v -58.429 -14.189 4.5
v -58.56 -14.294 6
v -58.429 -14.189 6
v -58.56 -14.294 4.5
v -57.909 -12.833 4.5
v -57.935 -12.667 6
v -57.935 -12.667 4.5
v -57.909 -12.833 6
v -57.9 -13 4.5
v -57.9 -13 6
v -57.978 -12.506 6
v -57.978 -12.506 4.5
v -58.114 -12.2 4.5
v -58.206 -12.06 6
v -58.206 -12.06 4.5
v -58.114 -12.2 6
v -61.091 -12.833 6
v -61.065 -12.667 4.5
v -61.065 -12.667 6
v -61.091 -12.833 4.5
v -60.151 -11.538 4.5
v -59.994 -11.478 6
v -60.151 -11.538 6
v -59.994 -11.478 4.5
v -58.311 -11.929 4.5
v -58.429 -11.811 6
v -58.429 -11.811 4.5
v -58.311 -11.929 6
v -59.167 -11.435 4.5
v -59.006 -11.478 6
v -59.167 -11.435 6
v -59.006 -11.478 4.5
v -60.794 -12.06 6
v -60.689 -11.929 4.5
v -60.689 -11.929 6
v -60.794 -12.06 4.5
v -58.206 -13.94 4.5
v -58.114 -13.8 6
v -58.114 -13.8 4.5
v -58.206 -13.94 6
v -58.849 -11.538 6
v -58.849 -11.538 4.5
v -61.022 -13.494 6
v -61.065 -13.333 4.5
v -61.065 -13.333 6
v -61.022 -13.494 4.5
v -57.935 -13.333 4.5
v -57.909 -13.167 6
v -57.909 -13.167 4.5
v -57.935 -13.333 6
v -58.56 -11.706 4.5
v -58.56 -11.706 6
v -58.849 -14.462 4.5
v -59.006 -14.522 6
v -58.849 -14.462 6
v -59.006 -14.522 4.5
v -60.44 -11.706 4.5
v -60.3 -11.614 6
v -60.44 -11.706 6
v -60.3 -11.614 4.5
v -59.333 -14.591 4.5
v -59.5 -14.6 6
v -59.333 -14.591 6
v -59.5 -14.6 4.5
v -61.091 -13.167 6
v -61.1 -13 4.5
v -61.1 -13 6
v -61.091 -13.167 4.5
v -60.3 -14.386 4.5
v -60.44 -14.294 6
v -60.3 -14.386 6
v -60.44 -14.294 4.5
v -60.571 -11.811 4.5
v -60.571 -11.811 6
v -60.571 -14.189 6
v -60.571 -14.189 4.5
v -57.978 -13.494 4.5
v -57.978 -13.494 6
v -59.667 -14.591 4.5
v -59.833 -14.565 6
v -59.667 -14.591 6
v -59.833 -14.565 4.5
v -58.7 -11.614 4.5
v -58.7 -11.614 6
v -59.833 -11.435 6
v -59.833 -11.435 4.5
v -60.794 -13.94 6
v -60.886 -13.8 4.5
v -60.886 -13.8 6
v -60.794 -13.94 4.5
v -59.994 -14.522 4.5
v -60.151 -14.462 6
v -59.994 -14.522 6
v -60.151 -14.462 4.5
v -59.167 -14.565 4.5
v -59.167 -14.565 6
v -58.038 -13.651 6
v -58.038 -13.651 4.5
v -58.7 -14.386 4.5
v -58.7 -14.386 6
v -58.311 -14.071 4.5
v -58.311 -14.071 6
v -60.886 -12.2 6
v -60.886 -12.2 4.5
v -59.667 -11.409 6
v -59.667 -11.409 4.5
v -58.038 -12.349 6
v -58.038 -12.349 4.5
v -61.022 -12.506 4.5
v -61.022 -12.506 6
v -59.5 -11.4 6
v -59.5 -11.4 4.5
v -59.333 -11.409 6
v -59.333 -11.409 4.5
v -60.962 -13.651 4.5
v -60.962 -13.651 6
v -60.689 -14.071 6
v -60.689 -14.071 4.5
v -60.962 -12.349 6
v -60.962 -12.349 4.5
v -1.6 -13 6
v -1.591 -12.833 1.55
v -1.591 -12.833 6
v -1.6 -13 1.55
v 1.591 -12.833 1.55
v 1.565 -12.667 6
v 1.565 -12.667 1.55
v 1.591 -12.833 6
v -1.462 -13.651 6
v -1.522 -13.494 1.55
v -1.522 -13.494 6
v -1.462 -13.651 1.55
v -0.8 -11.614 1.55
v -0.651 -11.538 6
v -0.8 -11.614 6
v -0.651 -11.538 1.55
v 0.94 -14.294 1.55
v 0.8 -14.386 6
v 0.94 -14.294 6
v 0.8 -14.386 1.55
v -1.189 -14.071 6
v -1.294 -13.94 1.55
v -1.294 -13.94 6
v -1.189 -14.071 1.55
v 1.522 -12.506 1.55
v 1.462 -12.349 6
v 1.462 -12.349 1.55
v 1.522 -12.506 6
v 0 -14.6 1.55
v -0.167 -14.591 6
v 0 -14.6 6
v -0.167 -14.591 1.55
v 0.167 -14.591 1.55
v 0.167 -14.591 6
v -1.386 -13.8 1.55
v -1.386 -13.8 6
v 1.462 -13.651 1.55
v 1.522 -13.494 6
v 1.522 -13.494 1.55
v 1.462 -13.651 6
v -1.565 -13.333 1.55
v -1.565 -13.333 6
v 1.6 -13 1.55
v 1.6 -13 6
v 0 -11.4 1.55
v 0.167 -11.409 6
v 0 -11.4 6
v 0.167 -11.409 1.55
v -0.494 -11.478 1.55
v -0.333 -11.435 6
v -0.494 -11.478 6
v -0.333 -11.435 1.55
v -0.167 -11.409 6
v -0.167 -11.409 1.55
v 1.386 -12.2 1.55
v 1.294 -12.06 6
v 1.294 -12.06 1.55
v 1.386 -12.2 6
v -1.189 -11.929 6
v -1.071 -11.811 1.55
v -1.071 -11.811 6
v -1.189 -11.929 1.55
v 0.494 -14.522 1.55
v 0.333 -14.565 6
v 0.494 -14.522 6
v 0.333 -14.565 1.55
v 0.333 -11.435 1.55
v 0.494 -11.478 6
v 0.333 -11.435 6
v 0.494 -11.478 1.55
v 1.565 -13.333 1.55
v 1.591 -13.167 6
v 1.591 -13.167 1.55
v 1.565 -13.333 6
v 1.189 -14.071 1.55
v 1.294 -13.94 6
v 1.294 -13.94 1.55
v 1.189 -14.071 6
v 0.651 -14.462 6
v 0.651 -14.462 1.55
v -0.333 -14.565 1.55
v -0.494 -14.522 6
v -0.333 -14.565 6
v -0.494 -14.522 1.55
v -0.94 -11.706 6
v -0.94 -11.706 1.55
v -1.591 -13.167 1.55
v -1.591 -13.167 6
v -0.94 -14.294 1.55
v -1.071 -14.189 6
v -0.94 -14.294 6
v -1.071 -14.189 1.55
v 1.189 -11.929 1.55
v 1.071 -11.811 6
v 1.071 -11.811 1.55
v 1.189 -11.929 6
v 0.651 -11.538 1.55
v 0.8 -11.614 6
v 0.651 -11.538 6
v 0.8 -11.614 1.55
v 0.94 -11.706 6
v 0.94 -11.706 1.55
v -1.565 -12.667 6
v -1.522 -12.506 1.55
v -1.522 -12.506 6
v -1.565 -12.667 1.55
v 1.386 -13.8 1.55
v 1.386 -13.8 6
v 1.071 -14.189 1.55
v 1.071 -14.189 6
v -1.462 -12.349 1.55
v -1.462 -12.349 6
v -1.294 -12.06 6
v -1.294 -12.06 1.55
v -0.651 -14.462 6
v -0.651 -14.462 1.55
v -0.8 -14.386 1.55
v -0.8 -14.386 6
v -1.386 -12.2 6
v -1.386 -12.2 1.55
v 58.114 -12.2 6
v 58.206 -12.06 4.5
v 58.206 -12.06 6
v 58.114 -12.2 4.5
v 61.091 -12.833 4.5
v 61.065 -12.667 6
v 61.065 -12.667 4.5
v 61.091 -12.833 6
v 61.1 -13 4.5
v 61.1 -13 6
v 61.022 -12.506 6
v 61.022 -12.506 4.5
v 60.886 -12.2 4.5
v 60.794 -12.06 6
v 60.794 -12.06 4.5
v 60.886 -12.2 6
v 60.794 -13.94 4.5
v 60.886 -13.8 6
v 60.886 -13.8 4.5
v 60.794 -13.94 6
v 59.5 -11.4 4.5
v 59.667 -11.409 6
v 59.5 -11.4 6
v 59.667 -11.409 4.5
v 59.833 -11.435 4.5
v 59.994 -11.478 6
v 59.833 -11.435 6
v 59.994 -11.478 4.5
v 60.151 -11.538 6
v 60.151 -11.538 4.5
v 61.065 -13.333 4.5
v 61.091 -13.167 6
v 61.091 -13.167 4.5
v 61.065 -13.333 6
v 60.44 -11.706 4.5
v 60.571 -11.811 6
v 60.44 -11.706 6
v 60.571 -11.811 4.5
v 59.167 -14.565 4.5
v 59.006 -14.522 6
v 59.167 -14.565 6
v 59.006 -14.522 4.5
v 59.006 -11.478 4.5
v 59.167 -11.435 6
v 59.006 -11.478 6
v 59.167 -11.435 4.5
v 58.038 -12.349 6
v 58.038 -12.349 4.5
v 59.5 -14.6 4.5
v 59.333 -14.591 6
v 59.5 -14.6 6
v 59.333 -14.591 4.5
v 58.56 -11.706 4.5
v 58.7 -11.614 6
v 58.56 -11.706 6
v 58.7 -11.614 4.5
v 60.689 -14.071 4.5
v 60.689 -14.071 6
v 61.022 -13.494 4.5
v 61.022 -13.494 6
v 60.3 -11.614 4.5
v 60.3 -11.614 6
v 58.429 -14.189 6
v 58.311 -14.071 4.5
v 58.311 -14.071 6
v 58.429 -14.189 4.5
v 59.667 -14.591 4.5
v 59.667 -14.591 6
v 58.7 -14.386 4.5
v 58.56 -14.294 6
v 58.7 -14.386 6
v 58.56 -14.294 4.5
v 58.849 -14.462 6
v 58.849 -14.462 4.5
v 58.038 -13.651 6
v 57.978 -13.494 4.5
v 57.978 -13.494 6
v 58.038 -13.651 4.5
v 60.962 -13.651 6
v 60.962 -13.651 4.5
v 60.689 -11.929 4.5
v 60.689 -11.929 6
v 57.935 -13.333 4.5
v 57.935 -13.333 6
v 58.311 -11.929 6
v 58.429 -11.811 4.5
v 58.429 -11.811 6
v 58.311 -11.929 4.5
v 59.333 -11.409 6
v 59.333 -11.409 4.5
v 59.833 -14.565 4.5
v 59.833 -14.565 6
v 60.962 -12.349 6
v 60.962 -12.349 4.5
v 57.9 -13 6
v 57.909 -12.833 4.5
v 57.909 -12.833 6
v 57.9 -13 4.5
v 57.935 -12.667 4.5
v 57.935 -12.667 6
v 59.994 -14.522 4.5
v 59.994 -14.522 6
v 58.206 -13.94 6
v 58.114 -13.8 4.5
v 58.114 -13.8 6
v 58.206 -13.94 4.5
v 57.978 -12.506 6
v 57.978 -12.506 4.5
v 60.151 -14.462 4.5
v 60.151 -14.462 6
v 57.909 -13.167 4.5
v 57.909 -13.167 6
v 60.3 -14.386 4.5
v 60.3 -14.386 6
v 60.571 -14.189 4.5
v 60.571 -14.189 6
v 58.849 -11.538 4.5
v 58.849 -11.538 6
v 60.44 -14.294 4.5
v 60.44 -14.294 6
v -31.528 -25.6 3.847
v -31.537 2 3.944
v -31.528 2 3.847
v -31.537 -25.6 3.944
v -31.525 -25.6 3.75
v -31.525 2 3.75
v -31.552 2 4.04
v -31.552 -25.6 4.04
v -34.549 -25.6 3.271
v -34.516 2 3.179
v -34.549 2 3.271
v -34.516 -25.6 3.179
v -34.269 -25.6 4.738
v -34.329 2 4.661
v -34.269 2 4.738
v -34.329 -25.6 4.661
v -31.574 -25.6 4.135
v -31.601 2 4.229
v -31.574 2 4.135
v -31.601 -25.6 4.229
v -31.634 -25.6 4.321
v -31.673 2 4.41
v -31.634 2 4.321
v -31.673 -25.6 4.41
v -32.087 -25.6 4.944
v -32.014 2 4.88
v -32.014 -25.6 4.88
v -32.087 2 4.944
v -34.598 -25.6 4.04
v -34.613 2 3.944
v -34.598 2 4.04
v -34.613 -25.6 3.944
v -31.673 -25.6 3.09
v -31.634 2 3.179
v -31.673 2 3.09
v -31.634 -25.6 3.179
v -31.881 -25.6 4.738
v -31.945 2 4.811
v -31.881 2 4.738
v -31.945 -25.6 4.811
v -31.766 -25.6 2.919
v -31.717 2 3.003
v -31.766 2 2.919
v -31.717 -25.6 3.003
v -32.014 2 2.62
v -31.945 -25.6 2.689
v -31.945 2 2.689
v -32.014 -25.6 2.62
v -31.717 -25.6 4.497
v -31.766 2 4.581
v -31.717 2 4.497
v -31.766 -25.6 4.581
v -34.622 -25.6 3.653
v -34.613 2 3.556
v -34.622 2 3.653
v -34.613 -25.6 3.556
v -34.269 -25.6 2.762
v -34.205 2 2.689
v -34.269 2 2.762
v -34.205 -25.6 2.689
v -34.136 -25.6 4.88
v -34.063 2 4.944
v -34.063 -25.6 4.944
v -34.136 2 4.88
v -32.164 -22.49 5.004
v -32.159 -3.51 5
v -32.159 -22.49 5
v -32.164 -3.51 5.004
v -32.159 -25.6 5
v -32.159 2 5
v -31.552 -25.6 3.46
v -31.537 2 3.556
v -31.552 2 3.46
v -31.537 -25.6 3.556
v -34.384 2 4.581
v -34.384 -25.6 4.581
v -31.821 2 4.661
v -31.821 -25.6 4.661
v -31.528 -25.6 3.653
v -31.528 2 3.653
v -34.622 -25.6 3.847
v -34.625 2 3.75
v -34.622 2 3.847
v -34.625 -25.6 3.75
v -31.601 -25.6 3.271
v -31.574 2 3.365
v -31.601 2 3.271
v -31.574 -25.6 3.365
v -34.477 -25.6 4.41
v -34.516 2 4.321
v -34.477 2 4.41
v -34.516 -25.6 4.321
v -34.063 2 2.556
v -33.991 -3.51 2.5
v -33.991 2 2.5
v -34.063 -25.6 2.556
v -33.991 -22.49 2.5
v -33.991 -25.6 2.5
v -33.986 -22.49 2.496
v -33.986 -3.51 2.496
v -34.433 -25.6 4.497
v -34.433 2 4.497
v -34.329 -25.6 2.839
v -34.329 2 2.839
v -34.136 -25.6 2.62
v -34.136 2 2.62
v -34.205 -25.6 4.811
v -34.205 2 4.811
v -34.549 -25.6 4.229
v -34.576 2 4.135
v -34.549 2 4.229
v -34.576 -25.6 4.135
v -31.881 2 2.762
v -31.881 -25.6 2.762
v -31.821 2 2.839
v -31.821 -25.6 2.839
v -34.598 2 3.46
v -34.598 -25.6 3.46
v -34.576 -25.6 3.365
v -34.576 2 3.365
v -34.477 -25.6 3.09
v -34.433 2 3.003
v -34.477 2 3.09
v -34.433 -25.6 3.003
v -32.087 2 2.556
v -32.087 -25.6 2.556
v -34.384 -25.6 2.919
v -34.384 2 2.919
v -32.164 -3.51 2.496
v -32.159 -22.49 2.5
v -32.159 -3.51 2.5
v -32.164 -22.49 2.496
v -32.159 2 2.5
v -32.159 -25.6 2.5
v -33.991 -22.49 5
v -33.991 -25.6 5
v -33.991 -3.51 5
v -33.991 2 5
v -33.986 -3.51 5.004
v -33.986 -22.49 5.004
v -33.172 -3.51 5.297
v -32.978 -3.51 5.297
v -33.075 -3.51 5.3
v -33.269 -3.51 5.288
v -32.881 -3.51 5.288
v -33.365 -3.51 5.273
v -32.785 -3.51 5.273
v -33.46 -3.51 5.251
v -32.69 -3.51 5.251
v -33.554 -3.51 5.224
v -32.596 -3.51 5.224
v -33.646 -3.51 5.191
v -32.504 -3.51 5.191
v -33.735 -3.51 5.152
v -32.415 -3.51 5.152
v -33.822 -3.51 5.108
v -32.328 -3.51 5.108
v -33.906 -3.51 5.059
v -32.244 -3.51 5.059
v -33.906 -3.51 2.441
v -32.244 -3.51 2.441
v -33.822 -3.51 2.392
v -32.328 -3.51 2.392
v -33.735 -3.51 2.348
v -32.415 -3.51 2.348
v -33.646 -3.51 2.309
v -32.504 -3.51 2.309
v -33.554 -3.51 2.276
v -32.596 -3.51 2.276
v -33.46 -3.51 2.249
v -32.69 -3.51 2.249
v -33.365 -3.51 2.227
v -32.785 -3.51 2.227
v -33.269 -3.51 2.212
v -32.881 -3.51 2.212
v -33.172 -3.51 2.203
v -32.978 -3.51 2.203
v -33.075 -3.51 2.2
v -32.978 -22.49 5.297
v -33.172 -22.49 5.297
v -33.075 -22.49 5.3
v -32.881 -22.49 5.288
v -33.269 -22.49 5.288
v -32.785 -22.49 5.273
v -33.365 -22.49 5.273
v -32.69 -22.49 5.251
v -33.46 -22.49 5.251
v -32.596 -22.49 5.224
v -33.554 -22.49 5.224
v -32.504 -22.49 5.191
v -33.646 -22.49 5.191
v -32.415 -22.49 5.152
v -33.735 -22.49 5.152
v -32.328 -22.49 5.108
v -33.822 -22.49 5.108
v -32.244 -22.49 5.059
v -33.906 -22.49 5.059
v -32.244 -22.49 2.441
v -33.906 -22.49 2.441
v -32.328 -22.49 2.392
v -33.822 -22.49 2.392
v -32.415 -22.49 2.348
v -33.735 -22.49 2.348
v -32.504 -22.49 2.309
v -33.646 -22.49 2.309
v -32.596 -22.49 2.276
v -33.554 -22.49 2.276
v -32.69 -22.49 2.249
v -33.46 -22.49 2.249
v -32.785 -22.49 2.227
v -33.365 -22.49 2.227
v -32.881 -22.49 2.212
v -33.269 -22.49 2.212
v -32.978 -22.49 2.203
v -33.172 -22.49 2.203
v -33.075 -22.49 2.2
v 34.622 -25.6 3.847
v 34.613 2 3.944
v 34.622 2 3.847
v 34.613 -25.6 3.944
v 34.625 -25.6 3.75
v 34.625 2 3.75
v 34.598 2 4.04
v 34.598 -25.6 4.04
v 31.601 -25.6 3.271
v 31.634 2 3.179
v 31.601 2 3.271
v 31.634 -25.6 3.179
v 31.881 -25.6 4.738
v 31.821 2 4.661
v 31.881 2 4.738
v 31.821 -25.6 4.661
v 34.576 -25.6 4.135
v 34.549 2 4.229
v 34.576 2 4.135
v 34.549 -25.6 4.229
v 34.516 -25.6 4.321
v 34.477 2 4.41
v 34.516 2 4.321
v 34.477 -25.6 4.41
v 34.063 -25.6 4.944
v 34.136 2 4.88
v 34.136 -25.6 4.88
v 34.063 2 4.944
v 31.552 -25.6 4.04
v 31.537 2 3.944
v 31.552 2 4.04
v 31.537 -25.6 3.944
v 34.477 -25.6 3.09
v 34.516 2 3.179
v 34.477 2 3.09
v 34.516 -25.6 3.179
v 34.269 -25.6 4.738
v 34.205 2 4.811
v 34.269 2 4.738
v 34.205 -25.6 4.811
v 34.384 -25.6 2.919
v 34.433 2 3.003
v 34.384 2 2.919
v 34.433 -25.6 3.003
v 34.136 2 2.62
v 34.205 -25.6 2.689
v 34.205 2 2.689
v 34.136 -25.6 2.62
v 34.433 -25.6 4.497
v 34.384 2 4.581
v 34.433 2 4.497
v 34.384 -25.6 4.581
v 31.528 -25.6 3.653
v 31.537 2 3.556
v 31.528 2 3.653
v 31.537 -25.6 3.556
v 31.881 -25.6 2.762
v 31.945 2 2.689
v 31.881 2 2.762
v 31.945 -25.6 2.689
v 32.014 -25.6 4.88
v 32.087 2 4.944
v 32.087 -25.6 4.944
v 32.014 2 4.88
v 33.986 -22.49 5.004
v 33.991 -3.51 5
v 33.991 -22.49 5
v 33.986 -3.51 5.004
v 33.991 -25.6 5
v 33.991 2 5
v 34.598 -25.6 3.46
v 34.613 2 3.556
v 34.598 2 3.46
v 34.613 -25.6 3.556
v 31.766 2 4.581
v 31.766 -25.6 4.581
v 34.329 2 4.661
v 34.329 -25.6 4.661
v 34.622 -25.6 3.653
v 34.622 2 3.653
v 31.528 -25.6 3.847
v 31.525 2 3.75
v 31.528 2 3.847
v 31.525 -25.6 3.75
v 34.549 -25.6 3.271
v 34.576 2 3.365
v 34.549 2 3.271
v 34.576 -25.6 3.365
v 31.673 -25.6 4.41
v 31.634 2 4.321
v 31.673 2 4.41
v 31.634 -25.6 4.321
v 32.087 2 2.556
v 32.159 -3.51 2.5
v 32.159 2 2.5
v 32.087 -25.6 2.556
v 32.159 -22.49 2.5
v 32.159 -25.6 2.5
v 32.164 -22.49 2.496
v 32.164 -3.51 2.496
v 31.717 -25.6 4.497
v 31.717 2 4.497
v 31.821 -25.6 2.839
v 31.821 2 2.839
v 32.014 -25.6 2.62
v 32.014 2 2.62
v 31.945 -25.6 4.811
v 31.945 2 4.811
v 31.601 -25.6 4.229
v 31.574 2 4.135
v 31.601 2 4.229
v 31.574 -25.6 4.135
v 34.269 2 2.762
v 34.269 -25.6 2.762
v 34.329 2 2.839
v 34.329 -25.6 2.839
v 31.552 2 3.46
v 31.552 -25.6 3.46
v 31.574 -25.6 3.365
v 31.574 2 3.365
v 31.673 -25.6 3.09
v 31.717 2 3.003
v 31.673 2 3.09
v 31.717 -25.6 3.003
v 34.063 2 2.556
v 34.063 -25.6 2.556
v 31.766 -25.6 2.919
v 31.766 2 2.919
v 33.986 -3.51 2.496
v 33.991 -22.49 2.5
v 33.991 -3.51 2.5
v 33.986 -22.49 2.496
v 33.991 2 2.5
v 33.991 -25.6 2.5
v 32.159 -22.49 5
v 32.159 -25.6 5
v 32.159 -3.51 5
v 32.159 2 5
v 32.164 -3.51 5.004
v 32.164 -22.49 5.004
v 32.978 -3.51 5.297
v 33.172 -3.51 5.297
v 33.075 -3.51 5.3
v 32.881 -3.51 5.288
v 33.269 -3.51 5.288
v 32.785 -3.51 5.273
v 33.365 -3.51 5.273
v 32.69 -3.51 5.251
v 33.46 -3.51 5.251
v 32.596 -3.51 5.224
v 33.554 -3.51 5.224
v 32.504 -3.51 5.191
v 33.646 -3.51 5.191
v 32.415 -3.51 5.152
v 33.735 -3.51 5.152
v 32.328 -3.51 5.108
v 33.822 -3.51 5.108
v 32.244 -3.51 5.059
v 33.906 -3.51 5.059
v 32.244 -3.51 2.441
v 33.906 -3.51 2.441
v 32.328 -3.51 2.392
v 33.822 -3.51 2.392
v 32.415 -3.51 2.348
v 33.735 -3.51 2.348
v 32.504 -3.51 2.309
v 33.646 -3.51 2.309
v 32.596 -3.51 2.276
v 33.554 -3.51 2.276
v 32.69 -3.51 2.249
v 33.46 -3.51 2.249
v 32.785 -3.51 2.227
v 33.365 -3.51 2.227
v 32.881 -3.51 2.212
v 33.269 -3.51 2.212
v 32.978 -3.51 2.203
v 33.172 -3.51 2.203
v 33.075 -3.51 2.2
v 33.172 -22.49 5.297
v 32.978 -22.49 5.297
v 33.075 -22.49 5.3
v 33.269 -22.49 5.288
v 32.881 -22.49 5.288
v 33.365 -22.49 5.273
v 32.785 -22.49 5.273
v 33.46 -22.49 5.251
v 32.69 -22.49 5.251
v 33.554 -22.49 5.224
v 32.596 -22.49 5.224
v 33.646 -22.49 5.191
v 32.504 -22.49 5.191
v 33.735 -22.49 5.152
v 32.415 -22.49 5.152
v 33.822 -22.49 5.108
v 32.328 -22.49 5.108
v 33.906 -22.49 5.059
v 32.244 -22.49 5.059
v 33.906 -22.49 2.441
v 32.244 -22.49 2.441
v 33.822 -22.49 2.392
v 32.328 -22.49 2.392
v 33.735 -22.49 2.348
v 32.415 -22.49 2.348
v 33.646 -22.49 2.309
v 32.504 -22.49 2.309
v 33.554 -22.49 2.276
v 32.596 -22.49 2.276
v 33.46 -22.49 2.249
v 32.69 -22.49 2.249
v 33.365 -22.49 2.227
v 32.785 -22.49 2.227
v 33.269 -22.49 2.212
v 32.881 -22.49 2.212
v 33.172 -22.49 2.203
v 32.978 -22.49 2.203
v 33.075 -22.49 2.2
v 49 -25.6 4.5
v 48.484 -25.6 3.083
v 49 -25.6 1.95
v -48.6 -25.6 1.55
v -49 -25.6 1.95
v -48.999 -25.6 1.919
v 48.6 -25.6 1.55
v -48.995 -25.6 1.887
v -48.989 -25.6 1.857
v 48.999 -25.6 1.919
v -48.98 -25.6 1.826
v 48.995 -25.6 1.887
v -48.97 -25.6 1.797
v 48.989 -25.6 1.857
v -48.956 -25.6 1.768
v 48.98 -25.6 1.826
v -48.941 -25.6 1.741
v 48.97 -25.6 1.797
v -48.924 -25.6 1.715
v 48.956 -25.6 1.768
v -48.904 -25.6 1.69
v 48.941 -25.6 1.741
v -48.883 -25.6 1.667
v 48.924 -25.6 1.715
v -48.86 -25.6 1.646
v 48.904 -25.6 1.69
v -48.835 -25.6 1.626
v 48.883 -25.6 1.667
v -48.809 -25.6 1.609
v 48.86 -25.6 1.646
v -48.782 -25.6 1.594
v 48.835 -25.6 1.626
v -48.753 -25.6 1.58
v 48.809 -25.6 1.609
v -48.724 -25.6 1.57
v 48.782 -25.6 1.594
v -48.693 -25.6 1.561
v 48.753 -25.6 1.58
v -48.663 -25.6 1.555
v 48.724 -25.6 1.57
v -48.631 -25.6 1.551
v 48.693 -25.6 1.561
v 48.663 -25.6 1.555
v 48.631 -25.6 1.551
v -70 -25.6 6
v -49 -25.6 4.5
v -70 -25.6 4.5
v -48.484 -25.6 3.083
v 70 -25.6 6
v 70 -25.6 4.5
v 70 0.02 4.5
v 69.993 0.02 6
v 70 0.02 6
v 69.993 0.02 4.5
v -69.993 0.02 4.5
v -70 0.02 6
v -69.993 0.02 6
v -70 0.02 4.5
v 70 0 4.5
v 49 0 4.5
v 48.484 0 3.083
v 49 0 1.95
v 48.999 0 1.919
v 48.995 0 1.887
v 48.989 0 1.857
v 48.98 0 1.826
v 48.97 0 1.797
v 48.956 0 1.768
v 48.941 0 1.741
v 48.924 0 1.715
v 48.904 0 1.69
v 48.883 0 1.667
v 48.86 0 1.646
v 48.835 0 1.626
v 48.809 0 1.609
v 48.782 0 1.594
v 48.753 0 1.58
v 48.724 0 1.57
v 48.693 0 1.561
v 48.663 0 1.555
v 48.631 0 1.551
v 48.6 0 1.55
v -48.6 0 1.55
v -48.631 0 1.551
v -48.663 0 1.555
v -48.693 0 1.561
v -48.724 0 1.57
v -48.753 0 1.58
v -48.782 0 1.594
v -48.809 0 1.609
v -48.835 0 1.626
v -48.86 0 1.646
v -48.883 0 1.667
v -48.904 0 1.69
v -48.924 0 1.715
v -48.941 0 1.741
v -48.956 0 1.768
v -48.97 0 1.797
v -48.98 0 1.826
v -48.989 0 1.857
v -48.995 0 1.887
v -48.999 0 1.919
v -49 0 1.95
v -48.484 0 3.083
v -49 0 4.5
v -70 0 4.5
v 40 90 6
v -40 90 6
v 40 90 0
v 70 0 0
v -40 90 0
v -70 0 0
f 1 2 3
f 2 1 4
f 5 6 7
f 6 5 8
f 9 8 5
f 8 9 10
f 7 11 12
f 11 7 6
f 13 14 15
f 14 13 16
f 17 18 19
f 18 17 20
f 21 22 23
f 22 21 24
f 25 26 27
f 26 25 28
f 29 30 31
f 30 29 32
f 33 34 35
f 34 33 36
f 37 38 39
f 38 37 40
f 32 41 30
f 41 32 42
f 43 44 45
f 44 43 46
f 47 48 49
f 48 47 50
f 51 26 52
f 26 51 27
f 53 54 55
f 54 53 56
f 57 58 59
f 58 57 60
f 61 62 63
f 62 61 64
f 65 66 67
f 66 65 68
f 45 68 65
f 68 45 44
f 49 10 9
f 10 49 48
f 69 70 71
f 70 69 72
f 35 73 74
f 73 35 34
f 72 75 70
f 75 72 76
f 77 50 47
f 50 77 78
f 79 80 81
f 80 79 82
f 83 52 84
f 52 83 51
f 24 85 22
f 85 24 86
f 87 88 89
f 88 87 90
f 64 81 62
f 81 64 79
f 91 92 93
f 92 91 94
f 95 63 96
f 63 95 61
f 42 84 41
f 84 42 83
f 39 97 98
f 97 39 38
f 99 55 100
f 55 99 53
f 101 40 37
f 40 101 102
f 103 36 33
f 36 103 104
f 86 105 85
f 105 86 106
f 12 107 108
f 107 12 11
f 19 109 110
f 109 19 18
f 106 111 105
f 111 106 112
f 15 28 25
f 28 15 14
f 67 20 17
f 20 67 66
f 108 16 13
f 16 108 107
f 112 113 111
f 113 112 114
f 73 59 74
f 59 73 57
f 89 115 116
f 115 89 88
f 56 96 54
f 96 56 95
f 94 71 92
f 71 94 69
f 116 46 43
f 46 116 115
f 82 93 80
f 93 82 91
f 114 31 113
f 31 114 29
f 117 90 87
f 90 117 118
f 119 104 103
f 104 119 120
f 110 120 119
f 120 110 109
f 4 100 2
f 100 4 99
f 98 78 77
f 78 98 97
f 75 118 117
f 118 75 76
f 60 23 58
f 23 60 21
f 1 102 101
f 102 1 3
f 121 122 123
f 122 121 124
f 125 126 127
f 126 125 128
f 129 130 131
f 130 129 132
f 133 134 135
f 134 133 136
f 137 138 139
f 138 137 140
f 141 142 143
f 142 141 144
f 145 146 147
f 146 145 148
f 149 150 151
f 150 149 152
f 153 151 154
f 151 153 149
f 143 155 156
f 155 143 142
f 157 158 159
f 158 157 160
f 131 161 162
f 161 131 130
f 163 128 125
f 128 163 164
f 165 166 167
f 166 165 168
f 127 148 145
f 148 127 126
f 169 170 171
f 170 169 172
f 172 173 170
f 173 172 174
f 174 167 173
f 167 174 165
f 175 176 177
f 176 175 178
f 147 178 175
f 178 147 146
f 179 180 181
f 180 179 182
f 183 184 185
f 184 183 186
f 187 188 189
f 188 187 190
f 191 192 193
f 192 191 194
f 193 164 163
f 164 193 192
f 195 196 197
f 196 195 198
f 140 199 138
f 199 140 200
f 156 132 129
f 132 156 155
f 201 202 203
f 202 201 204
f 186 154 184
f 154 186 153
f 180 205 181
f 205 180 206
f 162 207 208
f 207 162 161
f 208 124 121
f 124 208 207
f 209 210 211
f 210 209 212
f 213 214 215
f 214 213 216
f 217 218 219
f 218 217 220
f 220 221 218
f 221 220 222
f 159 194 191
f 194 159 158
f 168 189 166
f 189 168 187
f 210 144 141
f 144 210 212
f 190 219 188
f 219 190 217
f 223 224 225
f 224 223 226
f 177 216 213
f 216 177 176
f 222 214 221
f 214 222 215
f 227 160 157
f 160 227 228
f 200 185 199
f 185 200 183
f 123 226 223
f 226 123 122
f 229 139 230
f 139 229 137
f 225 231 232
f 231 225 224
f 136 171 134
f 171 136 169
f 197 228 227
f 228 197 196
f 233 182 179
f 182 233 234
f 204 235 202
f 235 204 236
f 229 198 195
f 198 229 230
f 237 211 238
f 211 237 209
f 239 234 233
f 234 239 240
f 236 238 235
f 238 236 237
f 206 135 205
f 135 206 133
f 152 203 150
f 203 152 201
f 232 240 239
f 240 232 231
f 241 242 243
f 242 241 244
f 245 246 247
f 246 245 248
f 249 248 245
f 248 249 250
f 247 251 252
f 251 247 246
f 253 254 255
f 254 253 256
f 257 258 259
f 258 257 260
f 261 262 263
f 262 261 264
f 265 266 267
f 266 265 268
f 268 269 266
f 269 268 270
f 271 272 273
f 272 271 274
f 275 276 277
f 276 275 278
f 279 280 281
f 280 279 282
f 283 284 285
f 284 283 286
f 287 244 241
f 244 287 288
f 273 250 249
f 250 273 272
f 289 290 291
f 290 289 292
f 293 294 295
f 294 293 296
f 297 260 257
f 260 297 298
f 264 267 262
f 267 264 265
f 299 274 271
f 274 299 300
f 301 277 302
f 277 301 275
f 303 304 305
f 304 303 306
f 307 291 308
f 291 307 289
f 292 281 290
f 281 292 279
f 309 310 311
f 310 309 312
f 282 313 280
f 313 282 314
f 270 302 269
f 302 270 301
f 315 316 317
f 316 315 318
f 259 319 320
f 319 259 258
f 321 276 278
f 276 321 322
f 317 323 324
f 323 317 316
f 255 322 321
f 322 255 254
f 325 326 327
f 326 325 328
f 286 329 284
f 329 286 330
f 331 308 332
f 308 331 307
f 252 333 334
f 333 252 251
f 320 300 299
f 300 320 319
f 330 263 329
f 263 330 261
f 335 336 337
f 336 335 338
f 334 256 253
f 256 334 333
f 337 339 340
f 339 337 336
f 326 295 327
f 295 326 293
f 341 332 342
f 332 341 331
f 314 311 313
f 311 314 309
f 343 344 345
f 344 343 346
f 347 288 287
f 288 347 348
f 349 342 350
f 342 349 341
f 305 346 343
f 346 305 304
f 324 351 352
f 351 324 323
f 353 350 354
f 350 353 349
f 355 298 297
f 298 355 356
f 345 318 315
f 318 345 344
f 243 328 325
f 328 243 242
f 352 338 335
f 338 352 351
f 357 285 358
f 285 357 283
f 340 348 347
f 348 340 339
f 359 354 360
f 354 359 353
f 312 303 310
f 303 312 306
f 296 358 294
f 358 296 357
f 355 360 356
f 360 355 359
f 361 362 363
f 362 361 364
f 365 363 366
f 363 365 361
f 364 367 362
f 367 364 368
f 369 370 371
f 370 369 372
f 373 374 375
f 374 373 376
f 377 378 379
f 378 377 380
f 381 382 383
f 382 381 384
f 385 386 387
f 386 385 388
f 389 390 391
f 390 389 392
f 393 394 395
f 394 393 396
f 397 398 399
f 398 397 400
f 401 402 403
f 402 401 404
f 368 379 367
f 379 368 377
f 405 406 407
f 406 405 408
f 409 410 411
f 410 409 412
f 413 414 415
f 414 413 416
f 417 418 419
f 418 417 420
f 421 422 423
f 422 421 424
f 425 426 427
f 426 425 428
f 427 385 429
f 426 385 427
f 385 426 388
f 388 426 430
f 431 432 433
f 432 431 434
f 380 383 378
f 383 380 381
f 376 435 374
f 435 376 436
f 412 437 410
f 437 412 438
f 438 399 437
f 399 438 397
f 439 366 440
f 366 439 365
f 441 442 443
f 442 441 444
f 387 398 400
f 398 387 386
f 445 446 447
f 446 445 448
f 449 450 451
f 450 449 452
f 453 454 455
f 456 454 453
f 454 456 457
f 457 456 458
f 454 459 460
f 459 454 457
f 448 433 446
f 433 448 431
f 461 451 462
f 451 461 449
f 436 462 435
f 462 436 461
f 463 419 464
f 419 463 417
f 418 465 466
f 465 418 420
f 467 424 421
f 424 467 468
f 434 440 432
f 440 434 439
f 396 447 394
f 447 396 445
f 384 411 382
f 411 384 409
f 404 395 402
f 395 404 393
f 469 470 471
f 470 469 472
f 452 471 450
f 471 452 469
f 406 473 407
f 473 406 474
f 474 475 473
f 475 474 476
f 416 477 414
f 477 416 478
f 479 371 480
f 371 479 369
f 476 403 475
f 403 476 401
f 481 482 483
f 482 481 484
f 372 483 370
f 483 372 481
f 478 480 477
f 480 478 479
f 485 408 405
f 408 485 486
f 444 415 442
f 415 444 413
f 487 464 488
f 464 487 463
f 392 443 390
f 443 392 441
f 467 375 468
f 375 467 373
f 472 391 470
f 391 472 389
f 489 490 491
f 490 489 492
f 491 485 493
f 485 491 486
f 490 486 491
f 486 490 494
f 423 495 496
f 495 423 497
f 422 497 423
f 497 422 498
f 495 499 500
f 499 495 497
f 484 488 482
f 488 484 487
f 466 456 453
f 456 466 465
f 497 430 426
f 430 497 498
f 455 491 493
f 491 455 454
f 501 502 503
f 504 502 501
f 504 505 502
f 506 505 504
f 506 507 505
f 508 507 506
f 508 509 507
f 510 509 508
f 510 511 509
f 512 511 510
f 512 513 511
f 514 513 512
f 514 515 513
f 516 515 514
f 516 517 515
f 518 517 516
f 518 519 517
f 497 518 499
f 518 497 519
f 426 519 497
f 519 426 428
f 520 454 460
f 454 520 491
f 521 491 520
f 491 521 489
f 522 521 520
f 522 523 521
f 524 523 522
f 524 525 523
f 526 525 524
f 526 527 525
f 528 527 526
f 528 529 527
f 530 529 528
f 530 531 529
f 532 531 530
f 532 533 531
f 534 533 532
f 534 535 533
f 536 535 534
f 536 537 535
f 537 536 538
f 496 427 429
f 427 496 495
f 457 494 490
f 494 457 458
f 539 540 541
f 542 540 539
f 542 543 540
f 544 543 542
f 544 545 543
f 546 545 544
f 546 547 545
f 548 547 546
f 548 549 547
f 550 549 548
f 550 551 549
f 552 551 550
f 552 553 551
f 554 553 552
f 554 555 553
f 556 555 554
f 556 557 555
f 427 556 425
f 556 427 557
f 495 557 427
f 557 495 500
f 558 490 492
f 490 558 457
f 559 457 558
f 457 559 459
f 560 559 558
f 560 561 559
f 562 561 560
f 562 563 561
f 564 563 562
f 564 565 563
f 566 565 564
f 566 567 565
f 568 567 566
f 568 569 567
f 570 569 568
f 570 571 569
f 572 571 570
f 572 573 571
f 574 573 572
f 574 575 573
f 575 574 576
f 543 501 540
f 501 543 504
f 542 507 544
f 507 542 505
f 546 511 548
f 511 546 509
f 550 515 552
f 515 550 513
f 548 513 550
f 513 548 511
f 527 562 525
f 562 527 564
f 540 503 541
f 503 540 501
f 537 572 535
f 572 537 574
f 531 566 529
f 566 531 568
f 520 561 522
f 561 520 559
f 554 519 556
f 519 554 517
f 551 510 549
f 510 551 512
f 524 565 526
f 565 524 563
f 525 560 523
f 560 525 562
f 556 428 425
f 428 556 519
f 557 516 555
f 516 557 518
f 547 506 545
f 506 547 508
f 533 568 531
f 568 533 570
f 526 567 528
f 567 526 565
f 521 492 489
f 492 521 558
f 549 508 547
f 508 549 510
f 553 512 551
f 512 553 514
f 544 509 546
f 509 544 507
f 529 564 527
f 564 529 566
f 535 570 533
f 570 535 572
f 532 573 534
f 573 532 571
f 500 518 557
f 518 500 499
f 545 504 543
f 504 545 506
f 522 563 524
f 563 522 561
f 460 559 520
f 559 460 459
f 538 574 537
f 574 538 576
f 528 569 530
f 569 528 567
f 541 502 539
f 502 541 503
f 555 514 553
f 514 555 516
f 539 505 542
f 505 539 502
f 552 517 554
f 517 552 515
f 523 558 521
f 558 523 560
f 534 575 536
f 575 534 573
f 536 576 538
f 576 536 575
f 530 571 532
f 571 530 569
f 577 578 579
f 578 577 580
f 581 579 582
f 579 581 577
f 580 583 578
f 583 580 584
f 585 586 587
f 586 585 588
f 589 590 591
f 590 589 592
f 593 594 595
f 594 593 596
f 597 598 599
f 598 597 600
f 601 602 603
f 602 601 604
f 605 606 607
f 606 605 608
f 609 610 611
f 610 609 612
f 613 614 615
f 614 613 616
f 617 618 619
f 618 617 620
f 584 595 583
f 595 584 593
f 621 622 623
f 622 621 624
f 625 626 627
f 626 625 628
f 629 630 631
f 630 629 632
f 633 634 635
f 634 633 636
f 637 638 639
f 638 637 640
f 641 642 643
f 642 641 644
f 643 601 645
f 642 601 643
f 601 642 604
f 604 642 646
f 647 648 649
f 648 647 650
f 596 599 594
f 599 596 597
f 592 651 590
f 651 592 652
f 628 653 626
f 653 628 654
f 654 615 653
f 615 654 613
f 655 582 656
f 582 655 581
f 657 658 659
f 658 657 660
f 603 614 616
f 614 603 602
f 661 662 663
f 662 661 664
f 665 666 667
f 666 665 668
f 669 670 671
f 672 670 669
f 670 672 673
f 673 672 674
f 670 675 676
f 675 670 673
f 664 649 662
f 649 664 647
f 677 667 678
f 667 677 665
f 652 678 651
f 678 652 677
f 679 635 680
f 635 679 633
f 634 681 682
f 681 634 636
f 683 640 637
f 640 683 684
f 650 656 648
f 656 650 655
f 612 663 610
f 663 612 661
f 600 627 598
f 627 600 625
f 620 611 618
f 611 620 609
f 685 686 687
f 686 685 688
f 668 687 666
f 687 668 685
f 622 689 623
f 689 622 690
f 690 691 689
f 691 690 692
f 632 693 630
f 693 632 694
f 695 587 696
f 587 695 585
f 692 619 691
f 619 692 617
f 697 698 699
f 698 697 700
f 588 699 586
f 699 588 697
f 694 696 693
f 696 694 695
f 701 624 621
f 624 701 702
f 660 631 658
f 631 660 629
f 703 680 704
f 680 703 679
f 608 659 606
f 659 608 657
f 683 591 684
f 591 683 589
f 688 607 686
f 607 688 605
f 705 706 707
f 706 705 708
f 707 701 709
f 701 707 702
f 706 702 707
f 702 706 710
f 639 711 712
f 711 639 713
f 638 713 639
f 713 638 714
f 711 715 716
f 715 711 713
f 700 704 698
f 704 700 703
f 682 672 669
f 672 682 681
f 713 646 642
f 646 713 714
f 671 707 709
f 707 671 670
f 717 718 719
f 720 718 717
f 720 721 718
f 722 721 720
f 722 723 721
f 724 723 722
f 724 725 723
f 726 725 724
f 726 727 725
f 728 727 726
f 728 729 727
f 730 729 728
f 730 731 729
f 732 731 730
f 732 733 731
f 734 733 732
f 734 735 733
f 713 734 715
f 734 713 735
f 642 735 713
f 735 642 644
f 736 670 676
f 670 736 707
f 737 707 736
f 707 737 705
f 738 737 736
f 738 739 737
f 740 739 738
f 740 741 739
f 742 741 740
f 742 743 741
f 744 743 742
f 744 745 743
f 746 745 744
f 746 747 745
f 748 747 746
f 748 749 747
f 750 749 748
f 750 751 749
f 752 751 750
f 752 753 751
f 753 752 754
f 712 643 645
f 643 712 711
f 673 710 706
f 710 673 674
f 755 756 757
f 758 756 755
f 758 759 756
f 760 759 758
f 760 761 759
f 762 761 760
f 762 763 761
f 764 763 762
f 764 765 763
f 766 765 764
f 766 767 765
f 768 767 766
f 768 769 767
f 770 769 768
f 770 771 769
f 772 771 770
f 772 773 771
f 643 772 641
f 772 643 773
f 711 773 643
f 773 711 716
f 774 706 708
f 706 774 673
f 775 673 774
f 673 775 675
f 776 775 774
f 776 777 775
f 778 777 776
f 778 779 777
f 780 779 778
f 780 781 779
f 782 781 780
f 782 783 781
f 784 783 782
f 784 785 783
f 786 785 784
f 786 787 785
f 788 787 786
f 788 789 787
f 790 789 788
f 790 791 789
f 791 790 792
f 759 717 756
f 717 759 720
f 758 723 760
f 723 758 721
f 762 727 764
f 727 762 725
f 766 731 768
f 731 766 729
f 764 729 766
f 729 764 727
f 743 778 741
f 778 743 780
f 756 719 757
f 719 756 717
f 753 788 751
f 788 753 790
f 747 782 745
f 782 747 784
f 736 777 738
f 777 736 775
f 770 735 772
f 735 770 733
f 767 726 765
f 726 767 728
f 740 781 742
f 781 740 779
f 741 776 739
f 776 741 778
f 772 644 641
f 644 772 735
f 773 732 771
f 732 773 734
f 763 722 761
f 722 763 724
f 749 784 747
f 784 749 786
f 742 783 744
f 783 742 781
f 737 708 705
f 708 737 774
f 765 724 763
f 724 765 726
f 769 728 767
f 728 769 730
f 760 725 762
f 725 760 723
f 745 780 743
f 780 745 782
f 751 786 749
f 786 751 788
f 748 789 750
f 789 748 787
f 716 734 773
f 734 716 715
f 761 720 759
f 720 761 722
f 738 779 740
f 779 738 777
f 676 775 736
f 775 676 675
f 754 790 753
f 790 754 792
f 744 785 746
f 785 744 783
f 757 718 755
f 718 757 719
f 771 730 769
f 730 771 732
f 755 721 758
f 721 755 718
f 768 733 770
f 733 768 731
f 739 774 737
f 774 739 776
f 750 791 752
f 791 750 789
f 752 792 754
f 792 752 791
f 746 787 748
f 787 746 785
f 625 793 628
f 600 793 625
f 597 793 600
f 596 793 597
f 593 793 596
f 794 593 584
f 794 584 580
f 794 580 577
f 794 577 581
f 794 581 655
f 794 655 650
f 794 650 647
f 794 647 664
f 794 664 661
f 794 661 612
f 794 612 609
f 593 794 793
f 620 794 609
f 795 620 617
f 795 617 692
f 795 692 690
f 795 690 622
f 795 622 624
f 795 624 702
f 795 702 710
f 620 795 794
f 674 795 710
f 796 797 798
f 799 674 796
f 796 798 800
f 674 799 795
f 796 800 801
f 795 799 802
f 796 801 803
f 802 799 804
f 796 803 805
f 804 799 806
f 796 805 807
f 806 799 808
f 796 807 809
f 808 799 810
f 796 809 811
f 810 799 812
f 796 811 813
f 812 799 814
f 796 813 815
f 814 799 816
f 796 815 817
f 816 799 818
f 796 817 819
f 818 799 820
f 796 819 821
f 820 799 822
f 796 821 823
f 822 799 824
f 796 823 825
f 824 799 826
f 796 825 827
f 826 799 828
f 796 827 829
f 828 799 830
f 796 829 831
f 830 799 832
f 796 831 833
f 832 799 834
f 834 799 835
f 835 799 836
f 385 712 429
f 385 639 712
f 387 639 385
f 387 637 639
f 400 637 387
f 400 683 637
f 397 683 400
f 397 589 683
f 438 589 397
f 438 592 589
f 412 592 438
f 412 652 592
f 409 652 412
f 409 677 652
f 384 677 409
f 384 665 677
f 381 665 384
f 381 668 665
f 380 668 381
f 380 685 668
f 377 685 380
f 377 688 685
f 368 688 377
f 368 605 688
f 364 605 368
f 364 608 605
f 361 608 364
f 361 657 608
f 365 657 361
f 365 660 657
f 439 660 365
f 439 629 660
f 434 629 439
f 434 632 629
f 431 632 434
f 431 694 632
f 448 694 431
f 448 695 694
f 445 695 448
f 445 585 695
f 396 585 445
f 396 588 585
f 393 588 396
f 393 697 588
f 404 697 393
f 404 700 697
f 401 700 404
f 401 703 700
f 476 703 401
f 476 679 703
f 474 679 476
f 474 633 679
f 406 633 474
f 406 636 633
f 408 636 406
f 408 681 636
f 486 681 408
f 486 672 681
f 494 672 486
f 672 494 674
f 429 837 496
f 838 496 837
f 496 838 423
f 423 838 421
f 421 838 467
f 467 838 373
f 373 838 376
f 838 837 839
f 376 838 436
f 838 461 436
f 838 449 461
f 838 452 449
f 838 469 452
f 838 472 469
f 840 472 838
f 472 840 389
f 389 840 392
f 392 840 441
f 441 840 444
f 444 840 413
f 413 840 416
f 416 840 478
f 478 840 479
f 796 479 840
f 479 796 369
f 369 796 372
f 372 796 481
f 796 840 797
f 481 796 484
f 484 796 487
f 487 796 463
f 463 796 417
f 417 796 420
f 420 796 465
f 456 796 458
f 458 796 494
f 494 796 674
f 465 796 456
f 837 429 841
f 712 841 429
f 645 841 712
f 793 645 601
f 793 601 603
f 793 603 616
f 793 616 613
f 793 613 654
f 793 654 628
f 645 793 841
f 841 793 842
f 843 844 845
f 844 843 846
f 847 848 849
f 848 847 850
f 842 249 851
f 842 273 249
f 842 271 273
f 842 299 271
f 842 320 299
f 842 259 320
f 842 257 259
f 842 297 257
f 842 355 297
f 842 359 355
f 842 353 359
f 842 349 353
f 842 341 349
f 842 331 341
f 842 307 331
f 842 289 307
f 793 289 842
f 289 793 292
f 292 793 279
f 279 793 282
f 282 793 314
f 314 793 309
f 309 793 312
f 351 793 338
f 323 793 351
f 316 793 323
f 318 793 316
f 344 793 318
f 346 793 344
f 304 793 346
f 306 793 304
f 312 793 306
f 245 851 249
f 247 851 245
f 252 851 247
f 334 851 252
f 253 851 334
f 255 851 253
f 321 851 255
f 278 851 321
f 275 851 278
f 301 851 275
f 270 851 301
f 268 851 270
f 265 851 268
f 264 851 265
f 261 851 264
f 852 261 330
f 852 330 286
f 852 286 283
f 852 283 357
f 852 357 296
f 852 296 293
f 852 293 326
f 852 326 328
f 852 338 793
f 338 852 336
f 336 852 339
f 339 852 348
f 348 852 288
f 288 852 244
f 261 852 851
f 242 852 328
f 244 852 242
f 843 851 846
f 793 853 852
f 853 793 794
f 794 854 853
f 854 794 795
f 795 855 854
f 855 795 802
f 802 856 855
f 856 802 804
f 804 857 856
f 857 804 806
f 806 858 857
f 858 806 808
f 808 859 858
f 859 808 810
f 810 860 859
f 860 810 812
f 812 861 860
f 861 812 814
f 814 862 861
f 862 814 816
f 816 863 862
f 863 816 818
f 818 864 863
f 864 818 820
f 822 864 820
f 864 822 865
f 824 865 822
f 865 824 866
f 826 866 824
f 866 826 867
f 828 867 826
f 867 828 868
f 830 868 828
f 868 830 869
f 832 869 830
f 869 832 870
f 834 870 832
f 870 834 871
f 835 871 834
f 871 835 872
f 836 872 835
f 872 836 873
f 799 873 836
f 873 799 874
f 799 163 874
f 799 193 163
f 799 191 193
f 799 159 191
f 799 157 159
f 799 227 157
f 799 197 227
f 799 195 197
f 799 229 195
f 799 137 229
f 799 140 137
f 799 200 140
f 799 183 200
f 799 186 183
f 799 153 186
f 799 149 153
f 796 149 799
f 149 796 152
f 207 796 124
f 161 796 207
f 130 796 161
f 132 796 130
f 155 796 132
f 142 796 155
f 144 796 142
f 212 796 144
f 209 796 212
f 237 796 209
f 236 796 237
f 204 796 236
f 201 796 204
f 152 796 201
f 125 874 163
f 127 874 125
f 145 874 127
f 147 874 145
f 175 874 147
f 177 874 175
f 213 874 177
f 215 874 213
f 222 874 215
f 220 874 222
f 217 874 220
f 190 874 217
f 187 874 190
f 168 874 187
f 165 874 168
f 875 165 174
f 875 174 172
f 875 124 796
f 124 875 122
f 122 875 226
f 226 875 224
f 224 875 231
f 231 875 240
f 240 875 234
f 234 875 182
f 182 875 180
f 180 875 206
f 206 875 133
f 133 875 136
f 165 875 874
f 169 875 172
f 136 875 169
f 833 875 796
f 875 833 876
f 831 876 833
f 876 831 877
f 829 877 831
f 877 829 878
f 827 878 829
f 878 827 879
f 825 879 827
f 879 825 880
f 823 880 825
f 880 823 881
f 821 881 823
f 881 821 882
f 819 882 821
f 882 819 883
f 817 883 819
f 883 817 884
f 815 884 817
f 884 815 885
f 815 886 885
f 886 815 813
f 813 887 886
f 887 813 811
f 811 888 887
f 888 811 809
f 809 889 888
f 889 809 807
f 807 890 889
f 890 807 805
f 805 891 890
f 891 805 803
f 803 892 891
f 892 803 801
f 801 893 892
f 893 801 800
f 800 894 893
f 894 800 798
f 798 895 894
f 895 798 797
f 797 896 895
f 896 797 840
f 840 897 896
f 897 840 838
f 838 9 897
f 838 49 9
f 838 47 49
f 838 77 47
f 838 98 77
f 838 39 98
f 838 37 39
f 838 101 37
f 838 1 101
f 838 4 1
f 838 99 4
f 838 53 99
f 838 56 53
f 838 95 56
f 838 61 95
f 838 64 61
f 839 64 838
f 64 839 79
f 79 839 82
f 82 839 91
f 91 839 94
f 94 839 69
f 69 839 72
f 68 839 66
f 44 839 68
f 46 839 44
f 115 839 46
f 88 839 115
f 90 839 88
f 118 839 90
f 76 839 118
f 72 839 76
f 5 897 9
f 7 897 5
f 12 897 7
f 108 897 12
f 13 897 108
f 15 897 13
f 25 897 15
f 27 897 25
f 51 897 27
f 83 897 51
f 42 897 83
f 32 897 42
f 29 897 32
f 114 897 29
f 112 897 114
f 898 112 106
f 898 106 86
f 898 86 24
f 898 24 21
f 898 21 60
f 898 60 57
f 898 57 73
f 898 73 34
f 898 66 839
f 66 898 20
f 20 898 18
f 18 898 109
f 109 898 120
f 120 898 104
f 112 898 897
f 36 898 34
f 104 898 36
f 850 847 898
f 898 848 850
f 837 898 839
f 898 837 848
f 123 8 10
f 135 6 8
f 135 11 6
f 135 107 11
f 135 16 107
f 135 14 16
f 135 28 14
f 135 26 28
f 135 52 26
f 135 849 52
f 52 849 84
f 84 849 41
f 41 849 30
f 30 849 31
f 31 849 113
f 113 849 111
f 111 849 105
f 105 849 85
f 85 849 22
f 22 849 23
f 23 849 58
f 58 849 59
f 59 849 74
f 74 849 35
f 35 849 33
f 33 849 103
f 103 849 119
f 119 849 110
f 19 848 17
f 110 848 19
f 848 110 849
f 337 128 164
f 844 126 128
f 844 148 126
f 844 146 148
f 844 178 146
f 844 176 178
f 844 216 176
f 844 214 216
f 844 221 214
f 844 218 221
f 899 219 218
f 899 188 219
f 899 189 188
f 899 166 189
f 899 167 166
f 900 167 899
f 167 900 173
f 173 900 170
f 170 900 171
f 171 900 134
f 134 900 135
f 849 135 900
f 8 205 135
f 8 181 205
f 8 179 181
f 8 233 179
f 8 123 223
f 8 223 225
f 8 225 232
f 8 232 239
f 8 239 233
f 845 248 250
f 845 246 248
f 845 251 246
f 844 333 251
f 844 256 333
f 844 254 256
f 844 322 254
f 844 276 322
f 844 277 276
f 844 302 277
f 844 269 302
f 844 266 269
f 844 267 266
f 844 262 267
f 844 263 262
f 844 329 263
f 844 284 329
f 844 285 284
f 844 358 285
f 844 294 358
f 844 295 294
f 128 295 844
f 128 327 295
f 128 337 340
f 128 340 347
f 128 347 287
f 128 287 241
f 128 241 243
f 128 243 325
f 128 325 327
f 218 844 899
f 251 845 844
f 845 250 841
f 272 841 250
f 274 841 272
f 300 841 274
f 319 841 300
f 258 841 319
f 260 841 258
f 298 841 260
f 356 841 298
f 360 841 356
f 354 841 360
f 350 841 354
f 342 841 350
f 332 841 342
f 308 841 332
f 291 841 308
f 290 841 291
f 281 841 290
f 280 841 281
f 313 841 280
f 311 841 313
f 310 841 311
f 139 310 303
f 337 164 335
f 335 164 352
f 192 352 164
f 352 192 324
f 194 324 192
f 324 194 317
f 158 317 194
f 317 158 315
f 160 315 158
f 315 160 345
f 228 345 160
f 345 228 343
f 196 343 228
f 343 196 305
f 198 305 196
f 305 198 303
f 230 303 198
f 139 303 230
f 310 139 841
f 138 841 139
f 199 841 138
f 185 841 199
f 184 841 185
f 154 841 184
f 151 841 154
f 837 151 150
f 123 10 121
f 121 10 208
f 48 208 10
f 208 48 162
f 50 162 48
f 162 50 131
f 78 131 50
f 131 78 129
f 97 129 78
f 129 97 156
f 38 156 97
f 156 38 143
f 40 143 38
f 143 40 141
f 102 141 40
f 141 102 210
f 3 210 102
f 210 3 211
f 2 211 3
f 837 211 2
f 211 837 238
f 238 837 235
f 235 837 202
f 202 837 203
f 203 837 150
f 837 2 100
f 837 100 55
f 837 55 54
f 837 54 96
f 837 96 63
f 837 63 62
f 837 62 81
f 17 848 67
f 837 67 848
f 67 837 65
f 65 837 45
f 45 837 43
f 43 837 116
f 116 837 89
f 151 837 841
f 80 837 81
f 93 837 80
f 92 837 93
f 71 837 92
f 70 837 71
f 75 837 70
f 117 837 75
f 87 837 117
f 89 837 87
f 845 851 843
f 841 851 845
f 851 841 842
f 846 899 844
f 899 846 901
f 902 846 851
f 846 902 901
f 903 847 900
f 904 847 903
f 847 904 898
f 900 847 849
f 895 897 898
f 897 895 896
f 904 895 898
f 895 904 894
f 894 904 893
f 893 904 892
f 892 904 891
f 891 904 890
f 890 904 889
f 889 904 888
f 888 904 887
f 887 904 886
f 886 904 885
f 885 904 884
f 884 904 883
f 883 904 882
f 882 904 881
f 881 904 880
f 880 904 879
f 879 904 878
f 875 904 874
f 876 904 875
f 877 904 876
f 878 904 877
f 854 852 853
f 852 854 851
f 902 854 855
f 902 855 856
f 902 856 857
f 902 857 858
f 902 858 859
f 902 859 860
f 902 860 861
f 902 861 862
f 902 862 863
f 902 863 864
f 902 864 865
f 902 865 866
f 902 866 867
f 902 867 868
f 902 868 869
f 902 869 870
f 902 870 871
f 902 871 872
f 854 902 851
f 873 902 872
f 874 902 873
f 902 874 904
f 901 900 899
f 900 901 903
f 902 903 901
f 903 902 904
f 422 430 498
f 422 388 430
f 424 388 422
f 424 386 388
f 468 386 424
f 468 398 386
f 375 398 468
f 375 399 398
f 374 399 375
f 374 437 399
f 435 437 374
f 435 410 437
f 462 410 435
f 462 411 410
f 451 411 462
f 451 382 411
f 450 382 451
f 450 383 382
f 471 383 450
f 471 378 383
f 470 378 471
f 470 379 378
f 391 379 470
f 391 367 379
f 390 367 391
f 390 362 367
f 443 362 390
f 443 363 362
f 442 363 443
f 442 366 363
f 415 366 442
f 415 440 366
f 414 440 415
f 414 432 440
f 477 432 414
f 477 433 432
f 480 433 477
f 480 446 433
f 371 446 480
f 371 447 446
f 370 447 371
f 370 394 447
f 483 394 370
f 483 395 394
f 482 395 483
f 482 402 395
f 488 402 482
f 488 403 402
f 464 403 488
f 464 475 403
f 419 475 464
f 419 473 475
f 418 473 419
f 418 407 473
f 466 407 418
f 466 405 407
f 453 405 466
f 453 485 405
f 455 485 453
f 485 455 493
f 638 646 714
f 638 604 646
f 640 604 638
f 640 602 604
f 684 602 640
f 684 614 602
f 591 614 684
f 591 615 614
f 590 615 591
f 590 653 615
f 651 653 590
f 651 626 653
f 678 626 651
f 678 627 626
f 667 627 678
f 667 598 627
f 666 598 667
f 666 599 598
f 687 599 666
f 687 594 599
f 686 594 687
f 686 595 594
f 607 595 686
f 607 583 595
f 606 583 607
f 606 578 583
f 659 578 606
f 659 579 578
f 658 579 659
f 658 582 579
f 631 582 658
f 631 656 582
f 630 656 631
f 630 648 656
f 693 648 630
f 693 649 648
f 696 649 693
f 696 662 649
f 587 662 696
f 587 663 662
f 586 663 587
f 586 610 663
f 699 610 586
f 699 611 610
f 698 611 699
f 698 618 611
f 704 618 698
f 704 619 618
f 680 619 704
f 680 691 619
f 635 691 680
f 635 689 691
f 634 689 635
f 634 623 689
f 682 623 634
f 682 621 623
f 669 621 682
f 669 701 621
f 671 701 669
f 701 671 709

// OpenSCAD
use <../../scad/components/plate_joint/example.scad>
use <../../scad/components/plate_joint/plate_joint.scad>
part = "plate_a";

// Match a typical common wrapper: these options arrive explicitly as undef.
module wrapper(mode, slot_mode, show_bolts, anchor, flip) {
  plate_joint(plate_h=6,
              bolt_d=3.2,
              w=140,
              l=26,
              pin_l=30,
              include_pin_holes=true,
              mode=mode,
              slot_mode=slot_mode,
              show_bolts=show_bolts,
              anchor=anchor,
              flip=flip);
}
module direct() {
  plate_joint(plate_h=6,
              bolt_d=3.2,
              w=140,
              l=26,
              pin_l=30,
              include_pin_holes=true);
}
if (part == "plate_a") {
  plate_a();
} else if (part == "plate_b") {
  plate_b();
} else if (part == "collision") {
  intersection() {
    plate_a();
    plate_b();
  }
} else if (part == "undef_difference") {
  difference() {
    wrapper();
    direct();
  }
  difference() {
    direct();
    wrapper();
  }
} else if (part == "male_slots_difference") {
  // At Y=1, the pin cutters must continue into plate A beyond the tongue.
  difference() {
    translate([33.075, 1, 3.75]) {
      rotate([90, 0, 0]) {
        cylinder(d=1, h=1, $fn=20);
      }
    }
    wrapper(mode="male", slot_mode=true);
  }
} else if (part == "thin_bolt_slots_difference") {
  // A thin plate's default male cutters must be plain shafts, without head recesses.
  difference() {
    plate_joint(plate_h=2, bolt_d=3, w=54, l=24, mode="male", slot_mode=true);
    for (x = [-22.95, 0, 22.95]) {
      translate([x, -12, -0.1]) {
        cylinder(d=3, h=2.2, $fn=60);
      }
    }
  }
}

if (part == "parent_pin_empty") {
  // Check the actual drilled parent material, beyond each end of the tongue.
  intersection() {
    plate_a();
    translate([33.075, 1, 3.75]) {
      sphere(r=0.3, $fn=20);
    }
  }
  intersection() {
    plate_b();
    translate([-33.075, -27, 3.75]) {
      sphere(r=0.3, $fn=20);
    }
  }
}

if (part == "auto_width_male" || part == "auto_width_female") {
  plate_joint(plate_h=6,
              bolt_d=3.2,
              l=26,
              pin_l=30,
              include_pin_holes=true,
              mode=part == "auto_width_male" ? "male" : "female");
}
if (part == "auto_width_collision") {
  intersection() {
    plate_joint(plate_h=6, bolt_d=3.2, l=26, pin_l=30, include_pin_holes=true);
    plate_joint(plate_h=6,
                bolt_d=3.2,
                l=26,
                pin_l=30,
                include_pin_holes=true,
                mode="female");
  }
}
